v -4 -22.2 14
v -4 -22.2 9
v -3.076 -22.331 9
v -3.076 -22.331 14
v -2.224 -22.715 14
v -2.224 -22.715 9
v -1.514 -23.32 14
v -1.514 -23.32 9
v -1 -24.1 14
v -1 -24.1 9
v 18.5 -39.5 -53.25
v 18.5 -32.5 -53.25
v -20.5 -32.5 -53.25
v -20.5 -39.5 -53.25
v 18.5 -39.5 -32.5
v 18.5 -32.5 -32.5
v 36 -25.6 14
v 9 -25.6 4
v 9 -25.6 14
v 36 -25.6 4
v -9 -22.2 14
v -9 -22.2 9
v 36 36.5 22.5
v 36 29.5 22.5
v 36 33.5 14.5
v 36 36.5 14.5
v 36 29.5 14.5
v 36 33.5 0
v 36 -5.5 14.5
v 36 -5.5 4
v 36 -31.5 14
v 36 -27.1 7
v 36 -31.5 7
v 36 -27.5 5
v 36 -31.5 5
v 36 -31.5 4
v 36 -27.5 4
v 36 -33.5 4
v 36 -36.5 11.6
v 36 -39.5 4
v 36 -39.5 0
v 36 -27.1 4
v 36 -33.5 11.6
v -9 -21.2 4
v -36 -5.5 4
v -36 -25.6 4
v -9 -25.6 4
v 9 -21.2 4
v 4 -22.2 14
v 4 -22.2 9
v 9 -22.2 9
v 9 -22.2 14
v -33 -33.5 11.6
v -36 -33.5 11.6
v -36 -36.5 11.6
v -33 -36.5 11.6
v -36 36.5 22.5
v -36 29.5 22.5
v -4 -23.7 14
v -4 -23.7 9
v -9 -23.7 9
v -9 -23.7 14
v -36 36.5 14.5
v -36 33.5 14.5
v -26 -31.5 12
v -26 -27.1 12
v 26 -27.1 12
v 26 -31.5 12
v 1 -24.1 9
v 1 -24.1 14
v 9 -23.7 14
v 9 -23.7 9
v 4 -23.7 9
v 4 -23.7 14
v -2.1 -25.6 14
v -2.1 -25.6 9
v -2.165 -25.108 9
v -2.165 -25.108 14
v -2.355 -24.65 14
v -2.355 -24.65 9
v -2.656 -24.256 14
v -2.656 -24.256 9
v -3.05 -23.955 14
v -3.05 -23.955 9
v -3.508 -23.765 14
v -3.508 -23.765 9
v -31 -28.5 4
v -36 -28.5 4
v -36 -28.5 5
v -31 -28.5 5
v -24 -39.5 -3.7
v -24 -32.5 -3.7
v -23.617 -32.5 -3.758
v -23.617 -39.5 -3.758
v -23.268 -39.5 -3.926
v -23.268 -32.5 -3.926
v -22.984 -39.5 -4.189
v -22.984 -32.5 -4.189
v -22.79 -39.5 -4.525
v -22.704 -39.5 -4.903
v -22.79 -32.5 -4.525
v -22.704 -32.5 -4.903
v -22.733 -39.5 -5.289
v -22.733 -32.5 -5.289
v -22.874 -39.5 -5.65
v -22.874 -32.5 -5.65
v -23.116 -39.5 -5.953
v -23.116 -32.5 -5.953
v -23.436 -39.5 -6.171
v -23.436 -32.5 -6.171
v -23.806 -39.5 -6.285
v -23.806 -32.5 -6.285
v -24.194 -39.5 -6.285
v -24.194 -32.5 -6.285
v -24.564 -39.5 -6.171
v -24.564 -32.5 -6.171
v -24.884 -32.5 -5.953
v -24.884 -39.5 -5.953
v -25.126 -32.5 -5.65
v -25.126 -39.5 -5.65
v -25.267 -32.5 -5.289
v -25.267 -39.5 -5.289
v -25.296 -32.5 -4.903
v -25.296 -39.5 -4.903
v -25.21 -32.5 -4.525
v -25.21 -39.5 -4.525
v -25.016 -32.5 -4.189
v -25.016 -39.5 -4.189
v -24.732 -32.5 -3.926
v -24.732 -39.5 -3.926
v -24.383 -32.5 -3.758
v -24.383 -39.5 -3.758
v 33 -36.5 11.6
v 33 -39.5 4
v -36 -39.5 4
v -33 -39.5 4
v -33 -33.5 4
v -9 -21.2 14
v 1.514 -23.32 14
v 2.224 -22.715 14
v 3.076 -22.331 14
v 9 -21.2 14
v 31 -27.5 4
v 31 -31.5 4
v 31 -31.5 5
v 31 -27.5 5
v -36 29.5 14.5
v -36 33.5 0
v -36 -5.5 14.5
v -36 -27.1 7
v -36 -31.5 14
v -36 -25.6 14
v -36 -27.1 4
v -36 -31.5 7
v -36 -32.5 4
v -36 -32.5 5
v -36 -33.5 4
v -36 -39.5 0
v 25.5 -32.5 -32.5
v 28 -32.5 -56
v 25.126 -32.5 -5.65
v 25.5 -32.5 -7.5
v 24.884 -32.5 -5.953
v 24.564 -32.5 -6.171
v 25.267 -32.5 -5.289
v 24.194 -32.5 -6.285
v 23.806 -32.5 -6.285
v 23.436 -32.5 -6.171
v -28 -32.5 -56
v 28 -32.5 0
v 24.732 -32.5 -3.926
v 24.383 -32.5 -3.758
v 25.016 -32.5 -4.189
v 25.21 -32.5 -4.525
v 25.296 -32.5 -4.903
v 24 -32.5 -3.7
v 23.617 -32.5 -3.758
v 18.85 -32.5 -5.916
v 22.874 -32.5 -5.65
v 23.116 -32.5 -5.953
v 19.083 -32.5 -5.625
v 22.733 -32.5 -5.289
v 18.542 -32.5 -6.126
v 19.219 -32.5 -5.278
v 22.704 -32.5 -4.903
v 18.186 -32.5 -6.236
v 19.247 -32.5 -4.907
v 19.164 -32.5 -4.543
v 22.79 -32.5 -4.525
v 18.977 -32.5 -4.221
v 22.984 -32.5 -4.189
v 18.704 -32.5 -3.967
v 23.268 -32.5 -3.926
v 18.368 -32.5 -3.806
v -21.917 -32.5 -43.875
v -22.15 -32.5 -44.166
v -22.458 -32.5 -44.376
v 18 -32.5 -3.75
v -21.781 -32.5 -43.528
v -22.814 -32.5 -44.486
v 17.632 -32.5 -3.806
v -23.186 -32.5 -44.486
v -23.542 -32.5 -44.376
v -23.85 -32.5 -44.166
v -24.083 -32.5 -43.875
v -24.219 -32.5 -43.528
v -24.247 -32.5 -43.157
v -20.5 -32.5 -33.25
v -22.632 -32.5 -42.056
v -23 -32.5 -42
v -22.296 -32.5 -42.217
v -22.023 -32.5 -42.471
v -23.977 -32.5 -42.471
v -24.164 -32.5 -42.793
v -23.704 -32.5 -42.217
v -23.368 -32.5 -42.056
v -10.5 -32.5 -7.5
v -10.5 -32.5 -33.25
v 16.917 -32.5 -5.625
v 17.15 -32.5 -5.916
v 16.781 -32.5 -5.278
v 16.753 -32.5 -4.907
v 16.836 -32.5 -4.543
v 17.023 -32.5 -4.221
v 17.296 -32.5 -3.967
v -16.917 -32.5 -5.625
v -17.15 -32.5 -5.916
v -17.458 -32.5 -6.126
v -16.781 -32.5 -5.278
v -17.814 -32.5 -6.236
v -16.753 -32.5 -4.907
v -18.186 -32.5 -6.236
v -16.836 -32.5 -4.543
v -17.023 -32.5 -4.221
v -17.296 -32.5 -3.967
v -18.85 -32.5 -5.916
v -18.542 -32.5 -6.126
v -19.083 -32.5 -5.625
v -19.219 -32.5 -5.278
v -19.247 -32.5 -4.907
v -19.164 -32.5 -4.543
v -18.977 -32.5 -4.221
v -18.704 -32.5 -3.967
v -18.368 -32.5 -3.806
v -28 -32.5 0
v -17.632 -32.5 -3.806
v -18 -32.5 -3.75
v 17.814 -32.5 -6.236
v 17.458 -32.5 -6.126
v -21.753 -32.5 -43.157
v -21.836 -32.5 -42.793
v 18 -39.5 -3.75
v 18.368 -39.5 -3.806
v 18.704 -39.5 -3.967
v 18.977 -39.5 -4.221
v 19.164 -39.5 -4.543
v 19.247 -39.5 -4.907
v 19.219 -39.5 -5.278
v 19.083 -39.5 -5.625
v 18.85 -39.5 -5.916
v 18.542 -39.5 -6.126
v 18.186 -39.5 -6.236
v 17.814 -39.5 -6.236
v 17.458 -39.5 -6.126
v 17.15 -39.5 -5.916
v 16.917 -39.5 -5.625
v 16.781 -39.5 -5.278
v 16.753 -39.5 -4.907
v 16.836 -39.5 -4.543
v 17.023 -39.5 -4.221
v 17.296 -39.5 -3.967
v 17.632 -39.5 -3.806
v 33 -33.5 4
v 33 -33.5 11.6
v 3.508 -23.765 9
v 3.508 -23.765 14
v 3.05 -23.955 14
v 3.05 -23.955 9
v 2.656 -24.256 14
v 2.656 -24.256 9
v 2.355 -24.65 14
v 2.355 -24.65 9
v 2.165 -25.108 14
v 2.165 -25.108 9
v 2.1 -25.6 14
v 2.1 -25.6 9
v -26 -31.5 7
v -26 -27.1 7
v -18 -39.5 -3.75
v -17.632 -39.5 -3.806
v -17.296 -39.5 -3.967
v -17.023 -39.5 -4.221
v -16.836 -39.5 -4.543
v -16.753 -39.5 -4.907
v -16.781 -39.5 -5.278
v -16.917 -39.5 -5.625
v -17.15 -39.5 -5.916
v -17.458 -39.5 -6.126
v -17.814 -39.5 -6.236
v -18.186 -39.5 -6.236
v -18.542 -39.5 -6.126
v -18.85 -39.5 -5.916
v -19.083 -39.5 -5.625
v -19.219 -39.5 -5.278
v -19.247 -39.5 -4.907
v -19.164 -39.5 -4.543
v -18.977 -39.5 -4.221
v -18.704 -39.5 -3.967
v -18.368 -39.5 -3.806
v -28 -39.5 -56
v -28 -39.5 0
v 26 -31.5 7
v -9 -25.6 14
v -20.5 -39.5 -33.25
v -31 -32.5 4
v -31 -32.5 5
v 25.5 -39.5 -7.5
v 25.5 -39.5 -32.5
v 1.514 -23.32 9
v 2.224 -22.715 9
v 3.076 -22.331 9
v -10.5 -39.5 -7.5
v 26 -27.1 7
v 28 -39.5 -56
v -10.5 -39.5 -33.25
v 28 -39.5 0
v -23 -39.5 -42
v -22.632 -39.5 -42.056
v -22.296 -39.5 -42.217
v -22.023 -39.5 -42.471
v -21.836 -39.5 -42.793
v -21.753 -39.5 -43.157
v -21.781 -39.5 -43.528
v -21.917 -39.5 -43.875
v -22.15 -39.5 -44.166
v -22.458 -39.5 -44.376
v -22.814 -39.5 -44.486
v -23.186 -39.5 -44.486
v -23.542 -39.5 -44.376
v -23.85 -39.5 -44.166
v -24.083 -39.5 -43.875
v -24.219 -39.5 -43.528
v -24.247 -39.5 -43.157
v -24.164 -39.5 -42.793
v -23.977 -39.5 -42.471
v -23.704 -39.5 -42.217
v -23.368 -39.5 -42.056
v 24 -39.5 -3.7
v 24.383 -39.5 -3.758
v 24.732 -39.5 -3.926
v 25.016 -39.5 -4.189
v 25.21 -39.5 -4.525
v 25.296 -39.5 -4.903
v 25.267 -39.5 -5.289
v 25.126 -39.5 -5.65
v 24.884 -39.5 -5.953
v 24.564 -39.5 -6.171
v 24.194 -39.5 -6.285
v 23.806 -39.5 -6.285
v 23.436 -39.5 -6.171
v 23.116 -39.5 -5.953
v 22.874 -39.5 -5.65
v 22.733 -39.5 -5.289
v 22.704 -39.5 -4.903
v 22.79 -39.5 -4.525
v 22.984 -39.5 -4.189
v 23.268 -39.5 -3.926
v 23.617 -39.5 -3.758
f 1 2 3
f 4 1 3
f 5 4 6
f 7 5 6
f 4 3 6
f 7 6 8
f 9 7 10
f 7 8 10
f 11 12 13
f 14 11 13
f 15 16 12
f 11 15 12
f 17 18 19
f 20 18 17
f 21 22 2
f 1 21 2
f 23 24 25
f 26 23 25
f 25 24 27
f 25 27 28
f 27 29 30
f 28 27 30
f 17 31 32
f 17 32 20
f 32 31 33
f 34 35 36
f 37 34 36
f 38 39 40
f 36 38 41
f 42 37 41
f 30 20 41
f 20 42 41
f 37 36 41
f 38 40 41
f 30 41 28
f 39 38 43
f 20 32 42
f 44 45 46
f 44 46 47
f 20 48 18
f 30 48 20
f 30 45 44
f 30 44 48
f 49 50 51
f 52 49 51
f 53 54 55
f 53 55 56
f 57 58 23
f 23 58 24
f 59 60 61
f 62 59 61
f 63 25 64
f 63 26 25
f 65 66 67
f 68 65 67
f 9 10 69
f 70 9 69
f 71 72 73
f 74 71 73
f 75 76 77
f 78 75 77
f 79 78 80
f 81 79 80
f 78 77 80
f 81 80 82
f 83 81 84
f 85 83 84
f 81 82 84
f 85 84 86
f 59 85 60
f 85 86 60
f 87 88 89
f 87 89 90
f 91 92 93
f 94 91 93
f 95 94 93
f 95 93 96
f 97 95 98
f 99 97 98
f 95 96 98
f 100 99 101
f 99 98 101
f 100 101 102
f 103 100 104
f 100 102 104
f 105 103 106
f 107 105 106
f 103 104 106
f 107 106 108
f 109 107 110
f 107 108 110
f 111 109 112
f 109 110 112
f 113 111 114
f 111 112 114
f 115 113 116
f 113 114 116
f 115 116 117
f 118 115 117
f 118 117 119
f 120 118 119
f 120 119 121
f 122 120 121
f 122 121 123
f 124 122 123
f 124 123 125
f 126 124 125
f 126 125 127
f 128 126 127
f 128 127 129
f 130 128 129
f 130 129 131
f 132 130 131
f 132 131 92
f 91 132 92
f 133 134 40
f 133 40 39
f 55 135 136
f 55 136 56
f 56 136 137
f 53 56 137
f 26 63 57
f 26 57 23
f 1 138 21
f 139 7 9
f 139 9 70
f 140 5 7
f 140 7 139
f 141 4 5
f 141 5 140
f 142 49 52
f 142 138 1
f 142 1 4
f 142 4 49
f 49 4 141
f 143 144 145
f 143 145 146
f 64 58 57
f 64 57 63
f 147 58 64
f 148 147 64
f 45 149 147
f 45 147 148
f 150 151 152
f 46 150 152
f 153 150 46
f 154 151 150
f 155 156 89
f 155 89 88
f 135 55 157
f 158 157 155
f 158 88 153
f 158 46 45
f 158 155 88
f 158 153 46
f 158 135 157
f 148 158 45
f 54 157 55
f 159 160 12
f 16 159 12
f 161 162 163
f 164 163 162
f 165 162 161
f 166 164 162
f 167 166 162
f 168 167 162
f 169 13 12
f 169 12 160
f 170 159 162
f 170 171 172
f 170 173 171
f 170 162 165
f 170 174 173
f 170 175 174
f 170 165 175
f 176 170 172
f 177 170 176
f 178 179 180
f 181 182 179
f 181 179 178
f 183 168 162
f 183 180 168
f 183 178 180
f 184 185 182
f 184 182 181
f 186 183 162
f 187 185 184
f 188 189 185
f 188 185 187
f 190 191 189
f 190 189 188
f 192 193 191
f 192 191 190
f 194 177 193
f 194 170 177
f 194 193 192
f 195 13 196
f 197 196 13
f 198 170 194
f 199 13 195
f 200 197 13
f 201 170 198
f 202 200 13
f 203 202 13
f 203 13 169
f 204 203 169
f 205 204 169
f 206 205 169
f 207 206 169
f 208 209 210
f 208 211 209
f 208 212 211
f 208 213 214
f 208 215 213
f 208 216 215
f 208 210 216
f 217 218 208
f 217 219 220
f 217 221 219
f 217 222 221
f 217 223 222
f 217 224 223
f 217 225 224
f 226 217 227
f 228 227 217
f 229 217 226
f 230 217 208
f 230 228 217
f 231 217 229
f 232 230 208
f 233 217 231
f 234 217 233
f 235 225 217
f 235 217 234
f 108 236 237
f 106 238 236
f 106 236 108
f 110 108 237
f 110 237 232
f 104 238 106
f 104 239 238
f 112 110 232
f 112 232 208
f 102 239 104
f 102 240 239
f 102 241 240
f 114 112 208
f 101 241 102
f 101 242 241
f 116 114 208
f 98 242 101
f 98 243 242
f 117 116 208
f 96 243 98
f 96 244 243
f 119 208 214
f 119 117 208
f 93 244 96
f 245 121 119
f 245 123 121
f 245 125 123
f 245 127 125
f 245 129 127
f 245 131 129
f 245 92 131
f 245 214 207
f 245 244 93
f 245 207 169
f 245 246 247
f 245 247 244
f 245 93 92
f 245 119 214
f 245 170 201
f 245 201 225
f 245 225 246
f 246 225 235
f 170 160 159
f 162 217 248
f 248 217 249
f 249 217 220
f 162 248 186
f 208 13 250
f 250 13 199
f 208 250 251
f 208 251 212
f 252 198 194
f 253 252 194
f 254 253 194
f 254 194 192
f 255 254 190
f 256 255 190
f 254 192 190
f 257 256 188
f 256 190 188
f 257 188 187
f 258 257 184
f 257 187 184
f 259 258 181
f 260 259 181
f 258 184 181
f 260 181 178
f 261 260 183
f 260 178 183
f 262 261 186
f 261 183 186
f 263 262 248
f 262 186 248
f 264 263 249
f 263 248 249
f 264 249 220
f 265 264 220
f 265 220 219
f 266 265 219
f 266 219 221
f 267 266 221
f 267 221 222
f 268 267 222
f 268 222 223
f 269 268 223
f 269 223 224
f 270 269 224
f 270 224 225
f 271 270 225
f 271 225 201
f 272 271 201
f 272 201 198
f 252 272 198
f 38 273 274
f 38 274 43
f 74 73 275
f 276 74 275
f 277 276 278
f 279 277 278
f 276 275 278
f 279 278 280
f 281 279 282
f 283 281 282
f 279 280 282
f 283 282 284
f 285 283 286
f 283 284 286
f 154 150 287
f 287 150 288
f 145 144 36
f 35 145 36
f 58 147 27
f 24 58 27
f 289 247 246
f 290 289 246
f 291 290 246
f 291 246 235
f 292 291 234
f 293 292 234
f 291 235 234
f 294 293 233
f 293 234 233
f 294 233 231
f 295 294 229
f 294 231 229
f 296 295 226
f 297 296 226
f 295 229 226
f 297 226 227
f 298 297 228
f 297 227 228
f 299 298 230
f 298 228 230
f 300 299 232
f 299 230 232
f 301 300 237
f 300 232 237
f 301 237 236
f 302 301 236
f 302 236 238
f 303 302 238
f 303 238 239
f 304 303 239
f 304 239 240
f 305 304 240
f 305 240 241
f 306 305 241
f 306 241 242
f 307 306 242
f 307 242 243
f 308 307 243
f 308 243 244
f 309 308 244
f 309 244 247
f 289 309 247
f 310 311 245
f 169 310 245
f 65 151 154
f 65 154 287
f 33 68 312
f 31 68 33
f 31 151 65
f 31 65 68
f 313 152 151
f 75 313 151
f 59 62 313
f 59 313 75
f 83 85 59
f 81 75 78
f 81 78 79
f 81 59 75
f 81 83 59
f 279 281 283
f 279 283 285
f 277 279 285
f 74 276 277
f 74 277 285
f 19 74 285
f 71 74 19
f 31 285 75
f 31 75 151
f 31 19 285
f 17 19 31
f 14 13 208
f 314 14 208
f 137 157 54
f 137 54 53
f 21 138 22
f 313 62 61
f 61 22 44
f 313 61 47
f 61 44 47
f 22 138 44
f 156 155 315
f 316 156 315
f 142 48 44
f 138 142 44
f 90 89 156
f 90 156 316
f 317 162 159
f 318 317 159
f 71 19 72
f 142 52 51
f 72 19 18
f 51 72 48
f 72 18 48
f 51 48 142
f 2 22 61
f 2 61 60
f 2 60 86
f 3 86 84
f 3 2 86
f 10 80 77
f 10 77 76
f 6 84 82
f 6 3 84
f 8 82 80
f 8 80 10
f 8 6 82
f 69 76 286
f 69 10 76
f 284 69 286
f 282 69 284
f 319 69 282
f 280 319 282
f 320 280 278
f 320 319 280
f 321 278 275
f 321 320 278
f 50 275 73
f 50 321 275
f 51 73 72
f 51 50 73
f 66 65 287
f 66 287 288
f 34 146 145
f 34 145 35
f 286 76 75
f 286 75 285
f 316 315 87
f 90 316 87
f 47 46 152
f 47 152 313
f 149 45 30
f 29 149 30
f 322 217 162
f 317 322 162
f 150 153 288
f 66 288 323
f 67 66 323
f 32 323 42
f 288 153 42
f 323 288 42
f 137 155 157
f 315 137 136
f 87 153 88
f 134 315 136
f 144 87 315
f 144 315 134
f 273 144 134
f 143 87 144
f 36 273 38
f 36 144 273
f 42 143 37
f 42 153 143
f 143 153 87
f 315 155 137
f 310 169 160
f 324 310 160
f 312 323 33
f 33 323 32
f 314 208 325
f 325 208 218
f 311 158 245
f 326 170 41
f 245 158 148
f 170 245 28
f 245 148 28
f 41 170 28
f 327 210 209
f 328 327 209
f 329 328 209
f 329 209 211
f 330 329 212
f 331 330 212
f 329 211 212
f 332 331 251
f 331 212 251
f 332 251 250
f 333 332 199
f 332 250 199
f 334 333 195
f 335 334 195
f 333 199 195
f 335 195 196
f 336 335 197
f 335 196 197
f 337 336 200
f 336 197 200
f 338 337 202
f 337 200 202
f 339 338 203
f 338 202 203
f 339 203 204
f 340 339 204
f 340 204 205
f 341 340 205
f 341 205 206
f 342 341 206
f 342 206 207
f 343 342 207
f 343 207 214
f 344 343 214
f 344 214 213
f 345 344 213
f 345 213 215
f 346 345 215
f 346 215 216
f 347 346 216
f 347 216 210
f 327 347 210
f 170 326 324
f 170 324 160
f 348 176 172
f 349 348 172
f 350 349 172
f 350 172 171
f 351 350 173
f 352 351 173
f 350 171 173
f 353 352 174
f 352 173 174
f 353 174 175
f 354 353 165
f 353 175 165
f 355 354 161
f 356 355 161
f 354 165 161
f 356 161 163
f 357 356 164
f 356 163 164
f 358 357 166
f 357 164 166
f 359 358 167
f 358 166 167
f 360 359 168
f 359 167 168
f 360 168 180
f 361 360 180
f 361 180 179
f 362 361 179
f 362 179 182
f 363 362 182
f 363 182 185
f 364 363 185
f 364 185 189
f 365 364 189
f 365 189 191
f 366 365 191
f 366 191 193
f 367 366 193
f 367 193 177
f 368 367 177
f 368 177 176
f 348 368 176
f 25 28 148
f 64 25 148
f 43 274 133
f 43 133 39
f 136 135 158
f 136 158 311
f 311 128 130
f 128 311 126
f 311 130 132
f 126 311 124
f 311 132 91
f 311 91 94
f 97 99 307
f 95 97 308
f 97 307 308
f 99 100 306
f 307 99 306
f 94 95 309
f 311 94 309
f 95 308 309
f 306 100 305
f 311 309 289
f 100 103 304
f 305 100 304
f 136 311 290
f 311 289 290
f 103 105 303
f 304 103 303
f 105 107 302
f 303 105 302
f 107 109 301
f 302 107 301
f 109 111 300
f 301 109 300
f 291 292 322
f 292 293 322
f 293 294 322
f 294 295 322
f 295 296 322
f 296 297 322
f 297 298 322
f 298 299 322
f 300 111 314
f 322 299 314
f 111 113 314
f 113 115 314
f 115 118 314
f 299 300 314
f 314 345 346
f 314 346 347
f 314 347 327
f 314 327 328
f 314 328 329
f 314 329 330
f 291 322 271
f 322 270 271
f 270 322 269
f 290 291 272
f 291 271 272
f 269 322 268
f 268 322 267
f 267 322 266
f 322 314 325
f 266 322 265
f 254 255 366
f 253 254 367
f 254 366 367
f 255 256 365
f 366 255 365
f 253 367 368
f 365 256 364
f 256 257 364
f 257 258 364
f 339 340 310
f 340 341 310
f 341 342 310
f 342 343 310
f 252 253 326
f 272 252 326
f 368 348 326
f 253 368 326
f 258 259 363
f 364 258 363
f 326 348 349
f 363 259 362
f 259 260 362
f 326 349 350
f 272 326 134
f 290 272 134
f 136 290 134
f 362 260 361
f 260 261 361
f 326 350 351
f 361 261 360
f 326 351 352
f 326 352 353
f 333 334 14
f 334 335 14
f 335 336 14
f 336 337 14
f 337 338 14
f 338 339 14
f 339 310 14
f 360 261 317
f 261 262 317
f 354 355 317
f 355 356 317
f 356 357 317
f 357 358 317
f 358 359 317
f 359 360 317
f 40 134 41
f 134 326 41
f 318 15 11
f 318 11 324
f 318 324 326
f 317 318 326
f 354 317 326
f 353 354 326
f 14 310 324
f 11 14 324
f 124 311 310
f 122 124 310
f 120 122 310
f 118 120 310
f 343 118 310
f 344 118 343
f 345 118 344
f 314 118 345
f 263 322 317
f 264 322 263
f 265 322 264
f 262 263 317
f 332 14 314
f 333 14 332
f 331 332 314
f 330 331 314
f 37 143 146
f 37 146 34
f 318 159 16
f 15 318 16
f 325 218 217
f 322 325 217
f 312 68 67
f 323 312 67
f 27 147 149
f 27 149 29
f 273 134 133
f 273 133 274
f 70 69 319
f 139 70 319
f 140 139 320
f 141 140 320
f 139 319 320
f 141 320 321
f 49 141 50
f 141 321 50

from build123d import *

# Parameters (mm, degrees)
CROQUIS1_W               = 72
CROQUIS1_H               = 74
SALIENTE_EXTRUIR3_DEPTH  = 4
CROQUIS2_W               = 3
CROQUIS2_H               = 6
SALIENTE_EXTRUIR4_DEPTH  = 7.6
CORTAR_EXTRUIR3_DEPTH    = 83.938591741
CROQUIS5_W               = 5
CROQUIS5_H               = 4
SALIENTE_EXTRUIR5_DEPTH  = 1
CROQUIS9_W               = 72
CROQUIS9_H               = 1.5
SALIENTE_EXTRUIR6_DEPTH  = 8
CROQUIS10_W              = 72
CROQUIS10_H              = 5.9
SALIENTE_EXTRUIR7_DEPTH  = 2
CROQUIS11_W              = 10
CROQUIS11_H              = 4.4
SALIENTE_EXTRUIR10_DEPTH = 7
SALIENTE_EXTRUIR14_DEPTH = 10
CROQUIS15_W              = 18
CROQUIS15_H              = 4.4
SALIENTE_EXTRUIR15_DEPTH = 5
CROQUIS16_W              = 72
CROQUIS16_H              = 40
SALIENTE_EXTRUIR16_DEPTH = 10.5
CROQUIS17_W              = 72
CROQUIS17_H              = 5
SALIENTE_EXTRUIR17_DEPTH = 8
CROQUIS18_W              = 72
CROQUIS18_H              = 8
SALIENTE_EXTRUIR19_DEPTH = 2
CROQUIS19_W              = 72
CROQUIS19_H              = 1
CORTAR_EXTRUIR4_DEPTH    = 14.5
CROQUIS20_W              = 56
CROQUIS20_H              = 7
SALIENTE_EXTRUIR20_DEPTH = 65
CORTAR_EXTRUIR6_REACH    = 103.4
CROQUIS27_W              = 56
CROQUIS27_H              = 9
CROQUIS26_R              = 1.25
CROQUIS26_R_2            = 1.3
CORTAR_EXTRUIR8_DEPTH    = 10


with BuildPart() as part:
    # Croquis1 → Saliente-Extruir3 (new body)
    with BuildSketch(Plane.XY):
        with Locations((0, -2.5)):
            Rectangle(CROQUIS1_W, CROQUIS1_H)
    extrude(amount=SALIENTE_EXTRUIR3_DEPTH)

    # Croquis2 → Saliente-Extruir4 (add)
    with BuildSketch(Plane.XY.offset(4)):
        with Locations((-34.5, -36.5)):
            Rectangle(CROQUIS2_W, CROQUIS2_H)
        with Locations((34.5, -36.5)):
            Rectangle(CROQUIS2_W, CROQUIS2_H)
    extrude(amount=SALIENTE_EXTRUIR4_DEPTH)

    # Croquis3 → Cortar-Extruir3 (cut, through all)
    with BuildSketch(Plane.ZY.offset(36)):
        Polygon((4, -39.5), (11.6, -36.5), (11.6, -39.5), align=None)
    extrude(amount=-CORTAR_EXTRUIR3_DEPTH, mode=Mode.SUBTRACT)

    # Croquis5 → Saliente-Extruir5 (add)
    with BuildSketch(Plane.XY.offset(4)):
        with Locations((-33.5, -30.5)):
            Rectangle(CROQUIS5_W, CROQUIS5_H)
        with Locations((33.5, -29.5)):
            Rectangle(CROQUIS5_W, CROQUIS5_H)
    extrude(amount=SALIENTE_EXTRUIR5_DEPTH)

    # Croquis9 → Saliente-Extruir6 (add)
    with BuildSketch(Plane.XY.offset(4)):
        with Locations((0, -26.35)):
            Rectangle(CROQUIS9_W, CROQUIS9_H)
    extrude(amount=SALIENTE_EXTRUIR6_DEPTH)

    # Croquis10 → Saliente-Extruir7 (add)
    with BuildSketch(Plane.XY.offset(12)):
        with Locations((0, -28.55)):
            Rectangle(CROQUIS10_W, CROQUIS10_H)
    extrude(amount=SALIENTE_EXTRUIR7_DEPTH)

    # Croquis11 → Saliente-Extruir10 (add)
    with BuildSketch(Plane.XY.offset(14)):
        with Locations((-31, -29.3)):
            Rectangle(CROQUIS11_W, CROQUIS11_H)
        with Locations((31, -29.3)):
            Rectangle(CROQUIS11_W, CROQUIS11_H)
    extrude(amount=-SALIENTE_EXTRUIR10_DEPTH)

    # Croquis14 → Saliente-Extruir14 (add)
    with BuildSketch(Plane.XY.offset(4)):
        with BuildLine():
            Line((-9, -23.7), (-9, -25.6))
            Line((-9, -25.6), (-2.1, -25.6))
            ThreePointArc((-2.1, -25.6), (-2.656497116, -24.256497116), (-4, -23.7))
            Line((-4, -23.7), (-9, -23.7))
        make_face()
        with BuildLine():
            Line((-9, -21.2), (-9, -22.2))
            Line((-9, -22.2), (-4, -22.2))
            ThreePointArc((-4, -22.2), (-2.22447191, -22.714955647), (-1, -24.1))
            Line((-1, -24.1), (1, -24.1))
            ThreePointArc((1, -24.1), (2.22447191, -22.714955647), (4, -22.2))
            Line((4, -22.2), (9, -22.2))
            Line((9, -22.2), (9, -21.2))
            Line((9, -21.2), (-9, -21.2))
        make_face()
        with BuildLine():
            ThreePointArc((4, -23.7), (2.656497116, -24.256497116), (2.1, -25.6))
            Line((2.1, -25.6), (9, -25.6))
            Line((9, -25.6), (9, -23.7))
            Line((9, -23.7), (4, -23.7))
        make_face()
    extrude(amount=SALIENTE_EXTRUIR14_DEPTH)

    # Croquis15 → Saliente-Extruir15 (add)
    with BuildSketch(Plane.XY.offset(4)):
        with Locations((0, -23.4)):
            Rectangle(CROQUIS15_W, CROQUIS15_H)
    extrude(amount=SALIENTE_EXTRUIR15_DEPTH)

    # Croquis16 → Saliente-Extruir16 (add)
    with BuildSketch(Plane.XY.offset(4)):
        with Locations((0, 14.5)):
            Rectangle(CROQUIS16_W, CROQUIS16_H)
    extrude(amount=SALIENTE_EXTRUIR16_DEPTH)

    # Croquis17 → Saliente-Extruir17 (add)
    with BuildSketch(Plane.XY.offset(14.5)):
        with Locations((0, 32)):
            Rectangle(CROQUIS17_W, CROQUIS17_H)
    extrude(amount=SALIENTE_EXTRUIR17_DEPTH)

    # Croquis18 → Saliente-Extruir19 (add)
    with BuildSketch(Plane(origin=(0, 34.5, 0), x_dir=(1, 0, 0), z_dir=(0, 1, 0))):
        with Locations((0, -18.5)):
            Rectangle(CROQUIS18_W, CROQUIS18_H)
    extrude(amount=SALIENTE_EXTRUIR19_DEPTH)

    # Croquis19 → Cortar-Extruir4 (cut)
    with BuildSketch(Plane(origin=(0, 0, 0), x_dir=(-1, 0, 0), z_dir=(0, 0, -1))):
        with Locations((0, 34)):
            Rectangle(CROQUIS19_W, CROQUIS19_H)
    extrude(amount=-CORTAR_EXTRUIR4_DEPTH, mode=Mode.SUBTRACT)

    # Croquis20 → Saliente-Extruir20 (add)
    with BuildSketch(Plane(origin=(0, 0, 0), x_dir=(-1, 0, 0), z_dir=(0, 0, -1))):
        with Locations((0, -36)):
            Rectangle(CROQUIS20_W, CROQUIS20_H)
    extrude(amount=SALIENTE_EXTRUIR20_DEPTH)

    # Croquis27 → Cortar-Extruir6 (cut, up to next)
    with BuildSketch(Plane(origin=(0, -32.5, 0), x_dir=(1, 0, 0), z_dir=(0, 1, 0)), mode=Mode.PRIVATE) as cortar_extruir6_sk1:
        with Locations((0, 60.5)):
            Rectangle(CROQUIS27_W, CROQUIS27_H)
    cortar_extruir6_tool1 = extrude(cortar_extruir6_sk1.sketch, amount=-CORTAR_EXTRUIR6_REACH, mode=Mode.PRIVATE) & part.part
    add(cortar_extruir6_tool1.solids().sort_by_distance((0, -32.5, -60.5))[0], mode=Mode.SUBTRACT)

    # Croquis26 → Cortar-Extruir8 (cut)
    with BuildSketch(Plane(origin=(0, -32.5, 0), x_dir=(1, 0, 0), z_dir=(0, 1, 0))):
        with Locations(Location((-18, 5, 0), (0, 0, 270))):
            Circle(CROQUIS26_R)
        with Locations(Location((18, 5, 0), (0, 0, 270))):
            Circle(CROQUIS26_R)
        with Locations(Location((-23, 43.25, 0), (0, 0, 270))):
            Circle(CROQUIS26_R)
        with Locations(Location((-24, 5, 0), (0, 0, 270))):
            Circle(CROQUIS26_R_2)
        Polygon((18.5, 53.25), (-20.5, 53.25), (-20.5, 33.25), (-10.5, 33.25), (-10.5, 7.5), (25.5, 7.5), (25.5, 32.5), (18.5, 32.5), align=None)
        with Locations(Location((24, 5, 0), (0, 0, 270))):
            Circle(CROQUIS26_R_2)
    extrude(amount=-CORTAR_EXTRUIR8_DEPTH, mode=Mode.SUBTRACT)


solid = part.part
